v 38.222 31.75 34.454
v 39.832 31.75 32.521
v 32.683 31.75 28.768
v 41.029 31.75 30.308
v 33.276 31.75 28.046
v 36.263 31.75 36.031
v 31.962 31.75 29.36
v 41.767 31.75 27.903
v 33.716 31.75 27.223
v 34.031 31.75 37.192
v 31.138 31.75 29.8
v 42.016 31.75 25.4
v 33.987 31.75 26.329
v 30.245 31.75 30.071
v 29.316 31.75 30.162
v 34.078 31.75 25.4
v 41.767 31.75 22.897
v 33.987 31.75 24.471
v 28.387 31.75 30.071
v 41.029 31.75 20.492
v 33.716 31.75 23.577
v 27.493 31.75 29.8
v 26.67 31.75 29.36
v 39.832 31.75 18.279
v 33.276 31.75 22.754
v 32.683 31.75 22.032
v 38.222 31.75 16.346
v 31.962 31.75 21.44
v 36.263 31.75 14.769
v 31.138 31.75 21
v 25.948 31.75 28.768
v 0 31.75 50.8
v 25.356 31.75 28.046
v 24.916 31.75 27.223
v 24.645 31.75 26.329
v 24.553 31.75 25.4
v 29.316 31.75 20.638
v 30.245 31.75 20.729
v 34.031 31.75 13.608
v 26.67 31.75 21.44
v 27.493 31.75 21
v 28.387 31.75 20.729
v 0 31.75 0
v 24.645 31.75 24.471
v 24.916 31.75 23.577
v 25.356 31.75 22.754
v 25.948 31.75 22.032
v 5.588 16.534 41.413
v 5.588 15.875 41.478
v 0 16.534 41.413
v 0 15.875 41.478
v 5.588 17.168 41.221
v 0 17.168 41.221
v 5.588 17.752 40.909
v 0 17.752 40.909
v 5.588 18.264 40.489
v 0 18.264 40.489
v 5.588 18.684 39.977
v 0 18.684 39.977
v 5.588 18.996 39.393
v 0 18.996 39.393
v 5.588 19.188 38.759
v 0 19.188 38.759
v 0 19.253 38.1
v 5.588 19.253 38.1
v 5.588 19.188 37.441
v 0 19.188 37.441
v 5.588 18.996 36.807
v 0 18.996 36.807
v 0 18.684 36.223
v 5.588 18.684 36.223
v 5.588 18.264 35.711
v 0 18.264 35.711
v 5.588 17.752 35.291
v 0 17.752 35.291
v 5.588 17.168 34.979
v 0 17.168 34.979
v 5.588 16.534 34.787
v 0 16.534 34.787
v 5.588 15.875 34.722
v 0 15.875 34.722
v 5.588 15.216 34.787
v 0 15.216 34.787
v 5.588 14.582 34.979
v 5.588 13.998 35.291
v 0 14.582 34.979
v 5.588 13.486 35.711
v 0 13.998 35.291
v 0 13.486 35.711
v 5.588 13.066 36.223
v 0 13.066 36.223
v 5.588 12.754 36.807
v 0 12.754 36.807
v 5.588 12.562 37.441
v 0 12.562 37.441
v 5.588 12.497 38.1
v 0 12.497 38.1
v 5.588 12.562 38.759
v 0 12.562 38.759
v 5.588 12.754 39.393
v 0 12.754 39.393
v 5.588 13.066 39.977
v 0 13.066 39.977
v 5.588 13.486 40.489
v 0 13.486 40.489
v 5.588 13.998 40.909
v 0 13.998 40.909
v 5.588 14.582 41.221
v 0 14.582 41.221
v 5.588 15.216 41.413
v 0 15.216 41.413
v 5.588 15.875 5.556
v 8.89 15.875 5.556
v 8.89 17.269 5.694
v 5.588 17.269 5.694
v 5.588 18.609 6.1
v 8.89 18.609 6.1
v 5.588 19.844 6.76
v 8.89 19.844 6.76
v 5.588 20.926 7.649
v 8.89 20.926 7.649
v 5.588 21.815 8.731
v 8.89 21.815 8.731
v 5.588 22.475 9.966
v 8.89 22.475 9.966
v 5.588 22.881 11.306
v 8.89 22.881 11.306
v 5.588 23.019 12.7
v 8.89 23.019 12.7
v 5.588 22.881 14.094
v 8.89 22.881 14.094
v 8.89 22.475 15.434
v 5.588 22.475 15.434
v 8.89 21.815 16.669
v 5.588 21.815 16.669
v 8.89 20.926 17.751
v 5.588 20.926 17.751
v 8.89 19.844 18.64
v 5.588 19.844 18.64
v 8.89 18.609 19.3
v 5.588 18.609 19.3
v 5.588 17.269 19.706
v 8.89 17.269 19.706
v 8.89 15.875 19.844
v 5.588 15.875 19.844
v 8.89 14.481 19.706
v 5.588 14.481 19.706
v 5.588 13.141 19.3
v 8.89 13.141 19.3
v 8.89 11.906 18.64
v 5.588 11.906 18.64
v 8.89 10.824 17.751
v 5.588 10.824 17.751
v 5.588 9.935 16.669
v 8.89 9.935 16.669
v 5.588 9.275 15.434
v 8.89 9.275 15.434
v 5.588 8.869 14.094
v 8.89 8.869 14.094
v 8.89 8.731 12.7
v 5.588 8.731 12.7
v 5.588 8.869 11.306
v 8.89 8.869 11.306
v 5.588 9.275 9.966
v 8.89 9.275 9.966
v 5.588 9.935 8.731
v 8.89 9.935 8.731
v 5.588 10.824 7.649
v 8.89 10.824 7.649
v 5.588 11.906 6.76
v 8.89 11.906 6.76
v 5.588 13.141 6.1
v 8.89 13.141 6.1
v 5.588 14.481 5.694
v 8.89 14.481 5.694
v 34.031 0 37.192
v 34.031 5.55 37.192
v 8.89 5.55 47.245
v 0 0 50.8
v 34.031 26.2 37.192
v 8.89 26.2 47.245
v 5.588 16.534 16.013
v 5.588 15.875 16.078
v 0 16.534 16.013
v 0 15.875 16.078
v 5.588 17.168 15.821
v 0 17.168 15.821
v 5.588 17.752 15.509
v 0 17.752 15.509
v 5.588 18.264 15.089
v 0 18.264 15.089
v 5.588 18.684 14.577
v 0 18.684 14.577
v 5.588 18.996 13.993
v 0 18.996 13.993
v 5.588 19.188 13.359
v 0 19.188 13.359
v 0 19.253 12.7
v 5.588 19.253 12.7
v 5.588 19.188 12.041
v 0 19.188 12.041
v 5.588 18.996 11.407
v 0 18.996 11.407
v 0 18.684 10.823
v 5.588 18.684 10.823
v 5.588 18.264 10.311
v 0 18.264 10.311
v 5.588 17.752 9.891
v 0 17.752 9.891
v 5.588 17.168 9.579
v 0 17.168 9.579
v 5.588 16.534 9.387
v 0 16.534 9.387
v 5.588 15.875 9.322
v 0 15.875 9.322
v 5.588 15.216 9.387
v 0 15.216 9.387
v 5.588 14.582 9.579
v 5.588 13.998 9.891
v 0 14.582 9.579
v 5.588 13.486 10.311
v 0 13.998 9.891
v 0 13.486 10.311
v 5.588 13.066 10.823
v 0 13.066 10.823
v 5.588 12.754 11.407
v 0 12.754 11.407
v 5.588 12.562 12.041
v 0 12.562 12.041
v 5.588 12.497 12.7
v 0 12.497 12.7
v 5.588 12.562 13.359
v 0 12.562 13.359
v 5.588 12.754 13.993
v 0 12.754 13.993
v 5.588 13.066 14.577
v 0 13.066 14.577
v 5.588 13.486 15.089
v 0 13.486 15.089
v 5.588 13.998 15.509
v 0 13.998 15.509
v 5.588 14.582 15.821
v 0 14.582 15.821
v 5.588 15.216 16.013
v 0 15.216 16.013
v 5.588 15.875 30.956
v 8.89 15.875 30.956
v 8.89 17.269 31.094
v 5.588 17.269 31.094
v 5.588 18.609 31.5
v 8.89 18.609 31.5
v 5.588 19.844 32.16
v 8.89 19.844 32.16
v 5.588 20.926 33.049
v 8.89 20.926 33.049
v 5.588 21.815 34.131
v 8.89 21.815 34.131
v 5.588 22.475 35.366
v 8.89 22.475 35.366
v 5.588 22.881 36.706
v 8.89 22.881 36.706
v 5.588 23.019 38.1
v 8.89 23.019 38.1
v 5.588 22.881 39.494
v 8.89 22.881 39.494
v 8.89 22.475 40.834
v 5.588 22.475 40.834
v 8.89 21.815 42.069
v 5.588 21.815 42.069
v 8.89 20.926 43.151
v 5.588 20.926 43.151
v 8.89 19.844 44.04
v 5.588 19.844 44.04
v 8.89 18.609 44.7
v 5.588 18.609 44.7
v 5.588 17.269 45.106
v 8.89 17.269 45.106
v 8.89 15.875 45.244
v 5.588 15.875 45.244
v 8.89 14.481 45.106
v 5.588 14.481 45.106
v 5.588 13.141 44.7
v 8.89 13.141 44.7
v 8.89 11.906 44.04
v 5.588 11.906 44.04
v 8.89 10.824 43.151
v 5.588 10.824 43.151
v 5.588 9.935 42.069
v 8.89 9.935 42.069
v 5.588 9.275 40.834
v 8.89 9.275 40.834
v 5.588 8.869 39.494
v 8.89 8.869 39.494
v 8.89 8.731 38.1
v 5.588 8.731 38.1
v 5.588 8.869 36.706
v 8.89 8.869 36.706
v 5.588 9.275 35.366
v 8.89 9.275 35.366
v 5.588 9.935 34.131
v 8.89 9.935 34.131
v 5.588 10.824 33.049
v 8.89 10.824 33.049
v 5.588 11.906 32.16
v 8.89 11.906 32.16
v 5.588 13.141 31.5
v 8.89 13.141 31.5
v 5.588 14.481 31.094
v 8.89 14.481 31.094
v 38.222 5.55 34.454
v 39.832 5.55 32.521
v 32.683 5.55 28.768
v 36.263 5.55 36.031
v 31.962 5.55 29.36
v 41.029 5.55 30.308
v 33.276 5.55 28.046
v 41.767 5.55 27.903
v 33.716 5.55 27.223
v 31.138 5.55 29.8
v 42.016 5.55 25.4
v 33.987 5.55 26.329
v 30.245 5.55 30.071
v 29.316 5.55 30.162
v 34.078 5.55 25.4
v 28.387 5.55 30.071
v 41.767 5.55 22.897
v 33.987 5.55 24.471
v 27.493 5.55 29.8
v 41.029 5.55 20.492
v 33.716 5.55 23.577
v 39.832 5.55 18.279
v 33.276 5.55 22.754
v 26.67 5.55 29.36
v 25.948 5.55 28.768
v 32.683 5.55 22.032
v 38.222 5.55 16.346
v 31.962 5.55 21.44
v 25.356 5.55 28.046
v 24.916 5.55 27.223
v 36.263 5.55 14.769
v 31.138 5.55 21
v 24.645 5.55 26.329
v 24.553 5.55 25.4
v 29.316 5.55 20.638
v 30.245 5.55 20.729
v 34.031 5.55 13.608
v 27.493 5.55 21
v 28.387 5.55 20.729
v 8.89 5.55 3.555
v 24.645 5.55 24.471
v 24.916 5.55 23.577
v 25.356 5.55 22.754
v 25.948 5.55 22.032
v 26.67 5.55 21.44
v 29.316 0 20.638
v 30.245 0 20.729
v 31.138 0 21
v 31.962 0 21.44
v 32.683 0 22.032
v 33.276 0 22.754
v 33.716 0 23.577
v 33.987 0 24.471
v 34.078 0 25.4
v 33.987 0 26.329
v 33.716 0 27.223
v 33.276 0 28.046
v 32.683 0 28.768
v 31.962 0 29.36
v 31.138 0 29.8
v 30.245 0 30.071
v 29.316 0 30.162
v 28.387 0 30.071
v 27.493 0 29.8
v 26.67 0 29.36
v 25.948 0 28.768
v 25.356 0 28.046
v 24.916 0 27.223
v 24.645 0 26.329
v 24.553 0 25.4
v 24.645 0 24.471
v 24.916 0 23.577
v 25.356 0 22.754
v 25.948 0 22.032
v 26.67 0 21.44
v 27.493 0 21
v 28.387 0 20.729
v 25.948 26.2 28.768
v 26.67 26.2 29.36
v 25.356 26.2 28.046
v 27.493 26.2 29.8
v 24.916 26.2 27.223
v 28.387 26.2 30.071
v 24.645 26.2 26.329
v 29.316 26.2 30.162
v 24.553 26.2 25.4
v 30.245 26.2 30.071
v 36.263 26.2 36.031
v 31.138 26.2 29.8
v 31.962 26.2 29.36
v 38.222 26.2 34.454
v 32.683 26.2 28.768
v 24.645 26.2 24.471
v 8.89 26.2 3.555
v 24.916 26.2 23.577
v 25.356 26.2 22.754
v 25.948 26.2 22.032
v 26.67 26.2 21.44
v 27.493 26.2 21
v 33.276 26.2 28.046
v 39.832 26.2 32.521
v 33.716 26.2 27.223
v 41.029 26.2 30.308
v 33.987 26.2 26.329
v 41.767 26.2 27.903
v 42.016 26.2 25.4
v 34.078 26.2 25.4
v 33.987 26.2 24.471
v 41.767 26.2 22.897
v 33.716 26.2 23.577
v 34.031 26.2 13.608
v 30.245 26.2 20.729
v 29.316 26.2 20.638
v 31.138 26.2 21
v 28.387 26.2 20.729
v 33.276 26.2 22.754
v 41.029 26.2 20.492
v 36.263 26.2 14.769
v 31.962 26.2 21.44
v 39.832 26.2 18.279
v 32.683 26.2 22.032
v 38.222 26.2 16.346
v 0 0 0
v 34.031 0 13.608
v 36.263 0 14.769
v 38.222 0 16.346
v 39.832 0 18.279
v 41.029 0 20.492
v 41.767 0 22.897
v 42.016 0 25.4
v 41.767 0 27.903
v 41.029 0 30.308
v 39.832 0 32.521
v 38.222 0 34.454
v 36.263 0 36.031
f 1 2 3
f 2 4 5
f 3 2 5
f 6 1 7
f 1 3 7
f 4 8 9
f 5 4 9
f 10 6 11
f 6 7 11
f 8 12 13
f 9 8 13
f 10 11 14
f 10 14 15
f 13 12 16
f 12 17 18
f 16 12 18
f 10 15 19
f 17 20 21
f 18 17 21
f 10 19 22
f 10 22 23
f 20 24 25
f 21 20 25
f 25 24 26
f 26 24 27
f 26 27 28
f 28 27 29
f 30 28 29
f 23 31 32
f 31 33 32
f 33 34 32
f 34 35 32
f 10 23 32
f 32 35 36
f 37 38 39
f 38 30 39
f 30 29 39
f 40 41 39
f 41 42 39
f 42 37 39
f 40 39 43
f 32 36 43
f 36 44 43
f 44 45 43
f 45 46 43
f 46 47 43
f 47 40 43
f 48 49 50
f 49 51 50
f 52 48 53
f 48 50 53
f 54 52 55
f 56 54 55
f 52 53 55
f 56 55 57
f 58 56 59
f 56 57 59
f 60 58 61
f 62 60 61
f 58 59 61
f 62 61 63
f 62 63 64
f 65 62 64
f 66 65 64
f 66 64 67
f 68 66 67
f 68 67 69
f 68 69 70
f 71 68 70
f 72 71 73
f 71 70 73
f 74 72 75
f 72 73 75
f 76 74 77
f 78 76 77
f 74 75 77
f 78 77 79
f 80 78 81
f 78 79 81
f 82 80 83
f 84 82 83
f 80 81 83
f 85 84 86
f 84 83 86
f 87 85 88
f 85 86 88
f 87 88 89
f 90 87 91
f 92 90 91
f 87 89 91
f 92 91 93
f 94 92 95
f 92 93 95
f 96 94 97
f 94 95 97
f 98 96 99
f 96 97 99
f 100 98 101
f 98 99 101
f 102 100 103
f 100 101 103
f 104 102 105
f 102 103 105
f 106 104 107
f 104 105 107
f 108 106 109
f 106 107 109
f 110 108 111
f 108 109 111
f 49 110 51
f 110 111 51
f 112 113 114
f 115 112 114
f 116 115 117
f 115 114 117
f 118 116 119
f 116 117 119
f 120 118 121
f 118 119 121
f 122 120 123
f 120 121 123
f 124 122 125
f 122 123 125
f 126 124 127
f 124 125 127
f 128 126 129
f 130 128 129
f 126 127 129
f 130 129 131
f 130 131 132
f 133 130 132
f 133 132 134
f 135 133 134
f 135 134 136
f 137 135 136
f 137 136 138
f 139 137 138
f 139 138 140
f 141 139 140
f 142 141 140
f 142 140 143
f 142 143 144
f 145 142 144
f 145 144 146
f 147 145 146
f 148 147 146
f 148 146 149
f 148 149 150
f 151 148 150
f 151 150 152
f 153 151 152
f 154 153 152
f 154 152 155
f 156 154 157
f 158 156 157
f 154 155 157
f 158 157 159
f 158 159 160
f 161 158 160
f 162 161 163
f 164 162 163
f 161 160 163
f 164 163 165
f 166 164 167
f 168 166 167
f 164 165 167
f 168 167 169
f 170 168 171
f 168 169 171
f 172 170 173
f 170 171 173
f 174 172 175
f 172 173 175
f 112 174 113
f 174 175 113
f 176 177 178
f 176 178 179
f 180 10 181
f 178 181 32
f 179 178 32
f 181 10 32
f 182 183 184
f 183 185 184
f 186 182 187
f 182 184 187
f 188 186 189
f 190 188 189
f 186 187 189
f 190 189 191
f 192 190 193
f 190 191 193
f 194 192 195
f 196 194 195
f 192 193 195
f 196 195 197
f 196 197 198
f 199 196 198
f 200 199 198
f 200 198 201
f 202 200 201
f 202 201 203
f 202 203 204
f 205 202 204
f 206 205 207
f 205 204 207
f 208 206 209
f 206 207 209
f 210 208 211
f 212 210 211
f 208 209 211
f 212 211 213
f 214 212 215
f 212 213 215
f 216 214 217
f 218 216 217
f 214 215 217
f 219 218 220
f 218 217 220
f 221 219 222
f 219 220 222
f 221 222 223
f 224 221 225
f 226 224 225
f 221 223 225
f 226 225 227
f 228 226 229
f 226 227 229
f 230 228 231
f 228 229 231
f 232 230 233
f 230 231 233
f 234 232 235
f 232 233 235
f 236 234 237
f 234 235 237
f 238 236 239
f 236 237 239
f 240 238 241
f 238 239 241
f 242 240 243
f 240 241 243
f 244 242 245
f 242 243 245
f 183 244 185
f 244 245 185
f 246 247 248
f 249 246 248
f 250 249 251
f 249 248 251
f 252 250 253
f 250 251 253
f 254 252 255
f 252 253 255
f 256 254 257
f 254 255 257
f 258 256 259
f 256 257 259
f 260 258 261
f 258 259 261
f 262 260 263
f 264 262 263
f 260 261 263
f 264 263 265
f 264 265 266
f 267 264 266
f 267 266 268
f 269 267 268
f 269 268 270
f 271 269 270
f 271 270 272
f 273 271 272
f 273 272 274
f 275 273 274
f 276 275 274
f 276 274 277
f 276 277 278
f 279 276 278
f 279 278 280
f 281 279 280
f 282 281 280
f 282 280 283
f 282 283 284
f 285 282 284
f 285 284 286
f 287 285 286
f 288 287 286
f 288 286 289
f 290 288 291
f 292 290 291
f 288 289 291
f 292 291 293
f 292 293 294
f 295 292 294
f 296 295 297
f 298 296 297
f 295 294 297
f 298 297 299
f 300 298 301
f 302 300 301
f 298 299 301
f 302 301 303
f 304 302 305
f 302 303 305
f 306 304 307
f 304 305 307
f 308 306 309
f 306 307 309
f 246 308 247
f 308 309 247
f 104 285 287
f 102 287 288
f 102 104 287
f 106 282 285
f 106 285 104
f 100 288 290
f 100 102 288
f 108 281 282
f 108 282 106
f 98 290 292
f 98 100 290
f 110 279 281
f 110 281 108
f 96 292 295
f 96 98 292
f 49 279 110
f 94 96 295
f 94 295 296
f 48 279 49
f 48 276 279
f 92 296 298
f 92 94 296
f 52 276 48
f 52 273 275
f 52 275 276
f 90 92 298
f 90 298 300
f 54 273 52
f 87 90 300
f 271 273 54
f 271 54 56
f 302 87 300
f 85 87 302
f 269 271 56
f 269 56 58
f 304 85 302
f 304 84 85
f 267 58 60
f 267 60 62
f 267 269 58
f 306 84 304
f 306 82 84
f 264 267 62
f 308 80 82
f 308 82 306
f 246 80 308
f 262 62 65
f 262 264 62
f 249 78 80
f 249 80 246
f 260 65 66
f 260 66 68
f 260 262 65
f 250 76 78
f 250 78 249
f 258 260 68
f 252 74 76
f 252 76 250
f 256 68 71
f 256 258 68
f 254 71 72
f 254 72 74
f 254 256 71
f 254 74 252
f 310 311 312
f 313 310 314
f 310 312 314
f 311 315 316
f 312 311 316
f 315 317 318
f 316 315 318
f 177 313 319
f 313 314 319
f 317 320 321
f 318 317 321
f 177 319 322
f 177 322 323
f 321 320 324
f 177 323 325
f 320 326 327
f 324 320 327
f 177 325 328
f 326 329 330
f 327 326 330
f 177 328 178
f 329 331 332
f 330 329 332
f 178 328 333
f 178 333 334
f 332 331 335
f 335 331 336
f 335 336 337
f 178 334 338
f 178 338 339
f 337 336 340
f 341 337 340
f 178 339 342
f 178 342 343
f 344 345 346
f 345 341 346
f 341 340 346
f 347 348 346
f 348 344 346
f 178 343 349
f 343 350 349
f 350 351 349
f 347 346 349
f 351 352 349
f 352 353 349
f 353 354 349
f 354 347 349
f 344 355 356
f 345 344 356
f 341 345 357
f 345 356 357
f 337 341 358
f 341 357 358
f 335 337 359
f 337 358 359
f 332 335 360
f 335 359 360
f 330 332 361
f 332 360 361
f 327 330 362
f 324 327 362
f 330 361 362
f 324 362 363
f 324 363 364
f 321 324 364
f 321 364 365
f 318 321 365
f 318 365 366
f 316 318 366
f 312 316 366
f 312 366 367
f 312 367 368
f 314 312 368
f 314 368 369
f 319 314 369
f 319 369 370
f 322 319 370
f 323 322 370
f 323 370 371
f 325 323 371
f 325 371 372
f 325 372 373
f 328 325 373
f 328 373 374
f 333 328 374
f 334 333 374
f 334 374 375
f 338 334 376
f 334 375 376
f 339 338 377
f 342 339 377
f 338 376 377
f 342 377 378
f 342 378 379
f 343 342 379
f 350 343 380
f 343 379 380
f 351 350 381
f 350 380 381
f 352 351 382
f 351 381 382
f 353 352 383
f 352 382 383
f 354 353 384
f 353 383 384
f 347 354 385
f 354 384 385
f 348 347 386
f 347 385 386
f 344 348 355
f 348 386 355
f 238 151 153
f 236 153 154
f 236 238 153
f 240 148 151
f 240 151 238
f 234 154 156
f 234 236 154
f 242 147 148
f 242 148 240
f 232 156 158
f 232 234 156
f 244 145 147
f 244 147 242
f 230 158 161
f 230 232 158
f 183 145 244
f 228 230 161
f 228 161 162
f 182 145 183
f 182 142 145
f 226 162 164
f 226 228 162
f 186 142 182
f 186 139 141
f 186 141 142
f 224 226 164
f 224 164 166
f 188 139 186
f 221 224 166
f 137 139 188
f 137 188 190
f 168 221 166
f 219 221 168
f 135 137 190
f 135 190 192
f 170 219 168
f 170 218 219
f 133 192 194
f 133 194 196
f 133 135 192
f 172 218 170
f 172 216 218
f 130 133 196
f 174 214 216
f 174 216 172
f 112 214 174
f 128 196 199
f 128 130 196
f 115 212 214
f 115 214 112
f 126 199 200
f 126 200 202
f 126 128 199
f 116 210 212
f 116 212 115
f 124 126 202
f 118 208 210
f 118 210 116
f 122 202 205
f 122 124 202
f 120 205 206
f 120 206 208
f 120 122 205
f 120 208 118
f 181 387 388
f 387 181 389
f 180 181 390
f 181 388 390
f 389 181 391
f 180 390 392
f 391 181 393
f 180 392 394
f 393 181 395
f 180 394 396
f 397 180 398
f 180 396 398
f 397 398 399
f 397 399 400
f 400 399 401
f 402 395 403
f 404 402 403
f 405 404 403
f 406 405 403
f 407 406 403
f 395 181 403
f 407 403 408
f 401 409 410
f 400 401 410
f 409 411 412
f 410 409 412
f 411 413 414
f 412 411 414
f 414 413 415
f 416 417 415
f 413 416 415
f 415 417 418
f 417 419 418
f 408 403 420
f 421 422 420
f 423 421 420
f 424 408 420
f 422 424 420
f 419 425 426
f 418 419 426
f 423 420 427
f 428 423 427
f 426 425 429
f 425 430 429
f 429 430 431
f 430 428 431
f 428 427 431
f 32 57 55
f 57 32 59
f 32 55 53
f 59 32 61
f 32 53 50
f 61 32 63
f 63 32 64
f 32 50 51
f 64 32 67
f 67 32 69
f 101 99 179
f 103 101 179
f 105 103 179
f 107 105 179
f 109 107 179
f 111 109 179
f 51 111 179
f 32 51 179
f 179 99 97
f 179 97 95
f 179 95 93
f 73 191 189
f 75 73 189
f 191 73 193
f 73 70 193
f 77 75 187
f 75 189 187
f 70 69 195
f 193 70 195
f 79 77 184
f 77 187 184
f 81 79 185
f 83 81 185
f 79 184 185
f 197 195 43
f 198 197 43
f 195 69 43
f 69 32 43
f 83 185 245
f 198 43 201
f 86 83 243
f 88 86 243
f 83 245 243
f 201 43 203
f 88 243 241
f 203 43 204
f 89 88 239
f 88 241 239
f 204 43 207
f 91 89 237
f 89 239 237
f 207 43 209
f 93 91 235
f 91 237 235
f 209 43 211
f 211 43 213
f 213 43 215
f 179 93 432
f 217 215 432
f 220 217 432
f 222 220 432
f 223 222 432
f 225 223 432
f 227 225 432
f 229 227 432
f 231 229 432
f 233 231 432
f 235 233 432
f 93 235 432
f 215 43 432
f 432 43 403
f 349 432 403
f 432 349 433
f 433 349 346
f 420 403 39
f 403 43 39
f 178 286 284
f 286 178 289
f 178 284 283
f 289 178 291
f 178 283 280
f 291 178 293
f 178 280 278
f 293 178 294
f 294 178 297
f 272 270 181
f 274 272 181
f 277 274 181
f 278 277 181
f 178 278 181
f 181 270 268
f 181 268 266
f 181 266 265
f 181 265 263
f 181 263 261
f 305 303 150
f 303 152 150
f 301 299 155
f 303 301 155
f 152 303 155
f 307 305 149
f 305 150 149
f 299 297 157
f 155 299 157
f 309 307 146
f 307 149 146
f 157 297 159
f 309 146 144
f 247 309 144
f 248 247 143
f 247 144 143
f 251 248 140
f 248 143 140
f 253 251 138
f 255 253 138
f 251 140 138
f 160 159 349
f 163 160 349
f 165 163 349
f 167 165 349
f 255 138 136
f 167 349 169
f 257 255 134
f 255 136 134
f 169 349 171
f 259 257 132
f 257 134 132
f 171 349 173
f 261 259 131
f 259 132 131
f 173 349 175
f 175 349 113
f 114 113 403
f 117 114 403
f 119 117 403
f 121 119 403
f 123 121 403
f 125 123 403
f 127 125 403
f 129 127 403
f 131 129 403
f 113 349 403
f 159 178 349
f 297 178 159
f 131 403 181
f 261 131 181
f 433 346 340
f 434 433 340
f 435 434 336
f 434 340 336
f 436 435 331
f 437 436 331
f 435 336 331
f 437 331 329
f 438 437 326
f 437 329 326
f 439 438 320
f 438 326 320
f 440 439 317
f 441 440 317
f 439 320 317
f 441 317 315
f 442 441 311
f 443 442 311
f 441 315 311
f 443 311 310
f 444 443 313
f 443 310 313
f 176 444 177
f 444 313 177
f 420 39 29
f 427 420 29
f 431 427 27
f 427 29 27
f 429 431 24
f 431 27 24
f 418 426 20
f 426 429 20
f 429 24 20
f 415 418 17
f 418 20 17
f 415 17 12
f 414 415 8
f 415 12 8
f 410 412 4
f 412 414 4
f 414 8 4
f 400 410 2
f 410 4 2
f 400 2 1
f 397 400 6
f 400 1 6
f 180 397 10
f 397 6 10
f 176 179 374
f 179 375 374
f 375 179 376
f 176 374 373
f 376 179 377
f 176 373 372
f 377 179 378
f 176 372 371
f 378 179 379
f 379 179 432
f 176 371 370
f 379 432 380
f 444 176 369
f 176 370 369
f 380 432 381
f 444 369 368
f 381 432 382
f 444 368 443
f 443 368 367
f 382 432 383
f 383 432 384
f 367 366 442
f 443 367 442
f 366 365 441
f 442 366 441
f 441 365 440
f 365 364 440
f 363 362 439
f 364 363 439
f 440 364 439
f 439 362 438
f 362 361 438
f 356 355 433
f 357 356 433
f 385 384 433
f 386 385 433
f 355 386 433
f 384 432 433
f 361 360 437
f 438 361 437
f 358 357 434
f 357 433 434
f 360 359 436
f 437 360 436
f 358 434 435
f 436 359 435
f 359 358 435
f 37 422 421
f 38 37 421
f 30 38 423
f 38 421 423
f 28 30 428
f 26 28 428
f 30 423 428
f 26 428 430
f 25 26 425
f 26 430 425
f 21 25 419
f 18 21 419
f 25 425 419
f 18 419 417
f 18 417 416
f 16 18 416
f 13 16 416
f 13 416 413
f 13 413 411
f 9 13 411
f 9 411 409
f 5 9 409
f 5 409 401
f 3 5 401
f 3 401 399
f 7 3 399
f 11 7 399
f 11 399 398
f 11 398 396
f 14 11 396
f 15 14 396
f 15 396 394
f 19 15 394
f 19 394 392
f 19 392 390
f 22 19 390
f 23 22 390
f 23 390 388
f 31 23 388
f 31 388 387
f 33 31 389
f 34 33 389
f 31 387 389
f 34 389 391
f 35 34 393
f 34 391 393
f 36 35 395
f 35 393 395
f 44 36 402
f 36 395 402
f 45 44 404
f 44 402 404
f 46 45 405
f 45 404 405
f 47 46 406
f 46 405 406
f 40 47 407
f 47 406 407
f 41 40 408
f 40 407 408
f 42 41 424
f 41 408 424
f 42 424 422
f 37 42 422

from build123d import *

# Parameters (mm, degrees)
BOSS_EXTRUDE1_DEPTH                                  = 50.8
CBORE_FOR_1_4_BINDING_HEAD_MACHINE_SCREW_D           = 6.7564
CBORE_FOR_1_4_BINDING_HEAD_MACHINE_SCREW_CBORE_D     = 14.2875
CBORE_FOR_1_4_BINDING_HEAD_MACHINE_SCREW_CBORE_DEPTH = 3.302
SPHERICAL_HOLES_REACH                                = 75.171
SKETCH3_R                                            = 4.7625
SKETCH4_OUTSIDE_W                                    = 58.65
SKETCH4_OUTSIDE_H                                    = 67.434
ROUNDING_DEPTH                                       = 31.75


with BuildPart() as part:
    # Sketch1 → Boss-Extrude1 (new body)
    with BuildSketch(Plane.XY):
        Polygon((0, 0), (42.015665571, 0), (42.015665571, 5.5499), (8.89, 5.5499), (8.89, 26.2001), (42.015665571, 26.2001), (42.015665571, 31.75), (0, 31.75), align=None)
    extrude(amount=BOSS_EXTRUDE1_DEPTH)

    # CBORE for 1/4 Binding Head Machine Screw1 (through all)
    with Locations(Plane(origin=(8.89, 0, 0), x_dir=(0, 0, -1), z_dir=(1, 0, 0))):
        with Locations((-38.1, 15.875), (-12.7, 15.875)):
            CounterBoreHole(CBORE_FOR_1_4_BINDING_HEAD_MACHINE_SCREW_D / 2, CBORE_FOR_1_4_BINDING_HEAD_MACHINE_SCREW_CBORE_D / 2, CBORE_FOR_1_4_BINDING_HEAD_MACHINE_SCREW_CBORE_DEPTH)

    # Spherical Holes: up to this face of the body (flat: up to its plane)
    spherical_holes_end = Plane(part.part.faces().sort_by_distance((21.007832786, 31.75, 25.4))[0])
    # Sketch3 → Spherical Holes (cut, up to the picked face)
    with BuildSketch(Plane.XZ, mode=Mode.PRIVATE) as spherical_holes_sk1:
        with Locations(Location((29.315665571, 25.4, 0), (0, 0, 270))):
            Circle(SKETCH3_R)
    spherical_holes_tool1 = split(extrude(spherical_holes_sk1.sketch, amount=-SPHERICAL_HOLES_REACH, mode=Mode.PRIVATE), bisect_by=spherical_holes_end, keep=Keep.BOTH, mode=Mode.PRIVATE)
    add(spherical_holes_tool1.solids().sort_by(Axis((29.315666, 0, 25.4), (0, 1, 0)))[0], mode=Mode.SUBTRACT)

    # Sketch4 outside → Rounding (cut)
    with BuildSketch(Plane(origin=(0, 31.75, 0), x_dir=(1, 0, 0), z_dir=(0, 1, 0))):
        with Locations((21.008, -25.4)):
            Rectangle(SKETCH4_OUTSIDE_W, SKETCH4_OUTSIDE_H)
        with BuildLine():
            Line((0, 0), (34.030957579, -13.607798285))
            ThreePointArc((34.030957579, -13.607798285), (42.015665571, -25.4), (34.030957579, -37.192201715))
            Line((34.030957579, -37.192201715), (0, -50.8))
            Line((0, -50.8), (0, 0))
        make_face(mode=Mode.SUBTRACT)
    extrude(amount=-ROUNDING_DEPTH, mode=Mode.SUBTRACT)


solid = part.part
